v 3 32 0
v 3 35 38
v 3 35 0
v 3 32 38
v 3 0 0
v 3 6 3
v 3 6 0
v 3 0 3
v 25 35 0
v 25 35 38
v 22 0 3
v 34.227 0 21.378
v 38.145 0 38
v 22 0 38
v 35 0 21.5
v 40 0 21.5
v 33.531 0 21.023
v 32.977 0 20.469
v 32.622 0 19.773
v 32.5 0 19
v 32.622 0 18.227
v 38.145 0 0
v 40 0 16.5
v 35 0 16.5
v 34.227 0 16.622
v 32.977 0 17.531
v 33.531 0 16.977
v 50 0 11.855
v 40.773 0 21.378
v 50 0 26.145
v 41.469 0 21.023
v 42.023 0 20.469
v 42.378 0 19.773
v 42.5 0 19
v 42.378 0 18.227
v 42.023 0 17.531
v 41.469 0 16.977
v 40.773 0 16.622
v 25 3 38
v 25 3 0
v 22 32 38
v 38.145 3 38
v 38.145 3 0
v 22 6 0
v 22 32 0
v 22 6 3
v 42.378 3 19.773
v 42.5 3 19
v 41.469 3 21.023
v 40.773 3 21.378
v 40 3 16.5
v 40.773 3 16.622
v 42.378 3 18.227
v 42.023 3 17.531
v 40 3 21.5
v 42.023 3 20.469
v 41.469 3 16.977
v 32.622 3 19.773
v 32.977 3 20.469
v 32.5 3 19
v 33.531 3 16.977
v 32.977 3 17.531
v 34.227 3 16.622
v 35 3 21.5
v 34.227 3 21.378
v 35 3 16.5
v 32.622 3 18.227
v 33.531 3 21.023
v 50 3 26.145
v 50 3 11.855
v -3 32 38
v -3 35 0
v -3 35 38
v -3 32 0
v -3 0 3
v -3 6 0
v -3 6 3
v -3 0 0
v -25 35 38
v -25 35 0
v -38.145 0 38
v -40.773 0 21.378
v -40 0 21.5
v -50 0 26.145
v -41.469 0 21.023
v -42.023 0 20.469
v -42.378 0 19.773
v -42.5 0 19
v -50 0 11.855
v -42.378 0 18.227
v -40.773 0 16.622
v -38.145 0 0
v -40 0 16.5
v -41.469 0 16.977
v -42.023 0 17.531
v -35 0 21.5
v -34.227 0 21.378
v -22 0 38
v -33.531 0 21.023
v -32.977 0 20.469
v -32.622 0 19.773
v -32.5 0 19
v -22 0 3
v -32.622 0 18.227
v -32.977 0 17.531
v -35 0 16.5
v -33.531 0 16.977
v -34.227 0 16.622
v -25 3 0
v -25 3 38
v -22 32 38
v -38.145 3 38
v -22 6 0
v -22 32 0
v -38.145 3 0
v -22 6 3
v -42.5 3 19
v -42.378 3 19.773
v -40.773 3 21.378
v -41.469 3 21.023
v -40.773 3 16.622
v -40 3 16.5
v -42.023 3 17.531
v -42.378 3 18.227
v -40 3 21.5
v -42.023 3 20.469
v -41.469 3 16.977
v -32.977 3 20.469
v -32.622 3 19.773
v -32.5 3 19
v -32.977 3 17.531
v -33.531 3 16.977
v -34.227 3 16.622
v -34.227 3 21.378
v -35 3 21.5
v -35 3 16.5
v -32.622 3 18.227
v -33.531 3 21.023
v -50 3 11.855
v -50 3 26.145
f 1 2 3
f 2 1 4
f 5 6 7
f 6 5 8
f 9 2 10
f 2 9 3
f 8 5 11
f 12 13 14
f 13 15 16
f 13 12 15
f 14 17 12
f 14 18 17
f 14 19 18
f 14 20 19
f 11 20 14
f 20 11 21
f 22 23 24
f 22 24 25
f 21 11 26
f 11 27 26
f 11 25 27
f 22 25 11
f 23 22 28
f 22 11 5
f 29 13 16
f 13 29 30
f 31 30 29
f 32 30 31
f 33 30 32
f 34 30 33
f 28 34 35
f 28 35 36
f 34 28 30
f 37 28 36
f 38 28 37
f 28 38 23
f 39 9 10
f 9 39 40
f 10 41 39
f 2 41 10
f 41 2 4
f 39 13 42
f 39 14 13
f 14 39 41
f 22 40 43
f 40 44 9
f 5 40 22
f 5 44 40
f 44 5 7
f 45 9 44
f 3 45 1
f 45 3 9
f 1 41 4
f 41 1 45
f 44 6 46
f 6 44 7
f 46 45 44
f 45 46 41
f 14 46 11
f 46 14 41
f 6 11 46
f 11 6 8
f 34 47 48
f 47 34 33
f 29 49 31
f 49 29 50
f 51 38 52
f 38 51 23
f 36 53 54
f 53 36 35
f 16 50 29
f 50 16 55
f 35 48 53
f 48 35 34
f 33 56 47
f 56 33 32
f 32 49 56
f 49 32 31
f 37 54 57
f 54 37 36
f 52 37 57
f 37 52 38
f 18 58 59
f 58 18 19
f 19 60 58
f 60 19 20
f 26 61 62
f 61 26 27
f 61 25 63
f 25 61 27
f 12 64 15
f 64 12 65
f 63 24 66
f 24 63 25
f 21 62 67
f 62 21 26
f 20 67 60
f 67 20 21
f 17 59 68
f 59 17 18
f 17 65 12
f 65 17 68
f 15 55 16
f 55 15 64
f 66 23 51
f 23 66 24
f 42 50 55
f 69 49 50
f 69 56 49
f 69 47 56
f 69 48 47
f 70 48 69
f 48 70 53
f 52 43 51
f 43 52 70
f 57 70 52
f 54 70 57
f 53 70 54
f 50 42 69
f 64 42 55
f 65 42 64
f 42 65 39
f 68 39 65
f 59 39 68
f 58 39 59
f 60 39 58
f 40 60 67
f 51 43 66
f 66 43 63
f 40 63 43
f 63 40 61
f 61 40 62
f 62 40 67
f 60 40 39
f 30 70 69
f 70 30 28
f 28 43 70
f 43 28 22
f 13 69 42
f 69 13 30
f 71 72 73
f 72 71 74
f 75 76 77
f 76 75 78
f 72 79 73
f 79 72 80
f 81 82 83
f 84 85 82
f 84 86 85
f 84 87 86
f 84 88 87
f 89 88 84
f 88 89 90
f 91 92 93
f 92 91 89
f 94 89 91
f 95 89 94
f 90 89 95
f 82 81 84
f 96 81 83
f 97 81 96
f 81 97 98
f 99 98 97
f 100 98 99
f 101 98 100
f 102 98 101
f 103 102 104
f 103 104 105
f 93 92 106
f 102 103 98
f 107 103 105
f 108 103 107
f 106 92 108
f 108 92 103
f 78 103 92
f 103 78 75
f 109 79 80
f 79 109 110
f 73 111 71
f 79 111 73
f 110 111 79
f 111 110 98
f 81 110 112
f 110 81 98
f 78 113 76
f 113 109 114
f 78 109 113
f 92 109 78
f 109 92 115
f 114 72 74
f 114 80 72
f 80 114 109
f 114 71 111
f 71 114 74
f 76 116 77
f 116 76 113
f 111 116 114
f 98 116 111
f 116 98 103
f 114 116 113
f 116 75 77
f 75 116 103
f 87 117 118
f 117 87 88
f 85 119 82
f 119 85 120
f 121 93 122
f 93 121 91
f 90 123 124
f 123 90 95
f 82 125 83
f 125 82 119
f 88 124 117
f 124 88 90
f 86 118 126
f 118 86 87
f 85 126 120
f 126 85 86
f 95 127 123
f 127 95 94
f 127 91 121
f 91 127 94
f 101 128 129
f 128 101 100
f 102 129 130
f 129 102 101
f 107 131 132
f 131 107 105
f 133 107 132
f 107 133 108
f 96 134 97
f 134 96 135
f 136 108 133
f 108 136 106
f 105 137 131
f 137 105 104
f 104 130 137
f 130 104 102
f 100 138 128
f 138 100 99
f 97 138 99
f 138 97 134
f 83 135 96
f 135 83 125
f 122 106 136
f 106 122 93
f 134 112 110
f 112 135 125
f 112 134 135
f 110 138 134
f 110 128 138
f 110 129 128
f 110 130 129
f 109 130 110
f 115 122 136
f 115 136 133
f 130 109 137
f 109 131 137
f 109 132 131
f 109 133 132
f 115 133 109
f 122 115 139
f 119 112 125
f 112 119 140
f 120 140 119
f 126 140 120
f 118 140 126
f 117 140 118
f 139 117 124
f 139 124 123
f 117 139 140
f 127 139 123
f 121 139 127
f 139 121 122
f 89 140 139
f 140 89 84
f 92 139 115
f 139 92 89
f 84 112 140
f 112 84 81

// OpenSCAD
//
//  Variable size box retainer for mounting
//  on a wall.
//
//  The main intention of this Thing is
//  to provide mounting for a Linksys Hub
//
//	  R. Lazure, February 16, 2014
//
//
//  ------------------------
//  inputs
//
/* [Box] */

//  Holding a box with a height of ...
box_ht = 32;  // [10:50]
//  Bottom of the holder has a block height of
block_ht= 6; // [0:45]
//  Top of the holder has a tab 
top_tab= 0;  // [0:45]
//  Side of the holder has a tab
side_tab = 0; // [0:30]
//  Length of the holder
length= 38; // [20:100]
//	 Holder width
box_wd = 19; // [10:50]
//
/* [Holding tab] */
//  Width of the tab that holds the screw
tab_width = 25;  // [15:75]
//  screw diameter
screw_dia=5; // [3:15]
//  center to center play in slot
slot_sp=5; // [0:15]
//  wall thickness  
thickness = 3; // [2:5]

/* [Hidden] */
$fn=20;
//
//   -------------------------
//		Module:  Housing
//	  -------------------------
//
module housing() {
difference()
	{
	difference ()
	{
//  outer block
	cube([thickness+box_wd,length,box_ht+thickness]);
	translate([thickness+side_tab,0,block_ht]) cube([box_wd+2, length+2,box_ht-block_ht-top_tab]);
	}
translate ([thickness,thickness,0]) cube([box_wd,length,box_ht]);
	}
}
//
//   -------------------------
//		Module:  tab
//	  -------------------------
// 
module tab() {
//
difference() {
// bottom plate
translate ([-tab_width,0,0]) cube([tab_width,length,thickness]);
//
//  slot position
translate([-tab_width/2-slot_sp/2,length/2,0])
//   slot
union(){
translate([0,0,-1])
cylinder(h=thickness+2,r=screw_dia/2);
translate([slot_sp,0,-1])
cylinder(h=thickness+2,r=screw_dia/2);
translate([0,-screw_dia/2,-1])
cube([slot_sp,screw_dia,thickness+2]);
		}
	}
}
//
//		-------------------
//		Module: box holder
//		-------------------
//
module box_holder() {
housing();
difference() {
difference() {
tab();
//     chamfer 1
// create a large cube rotated 45 degrees to cut the corner
translate([-tab_width-2.5,-tab_width+4,-1])
rotate([0,0,45])
cube([tab_width,tab_width,thickness+2]);
             }
//		 chamfer 2
// create a large cube rotated 45 degrees to cut the corner
translate([-tab_width*1.9,length+1,-1])
rotate([0,0,-45])
cube([tab_width,tab_width,thickness+2]);
              }
}
//		-------------
//   			Main
//		-------------
//
//  for Thingiverse Customizer
//  two clamps are made

//   rotate for proper orientation
//  in MakerWare for slicing
//
rotate([90,0,180]) {
//	  original clamp
translate([-box_wd-thickness-3,0,0])
box_holder();
//   mirror copy of the same clamp
mirror([1,0,0])
translate([-box_wd-thickness-3,0,0])
box_holder();
				}
